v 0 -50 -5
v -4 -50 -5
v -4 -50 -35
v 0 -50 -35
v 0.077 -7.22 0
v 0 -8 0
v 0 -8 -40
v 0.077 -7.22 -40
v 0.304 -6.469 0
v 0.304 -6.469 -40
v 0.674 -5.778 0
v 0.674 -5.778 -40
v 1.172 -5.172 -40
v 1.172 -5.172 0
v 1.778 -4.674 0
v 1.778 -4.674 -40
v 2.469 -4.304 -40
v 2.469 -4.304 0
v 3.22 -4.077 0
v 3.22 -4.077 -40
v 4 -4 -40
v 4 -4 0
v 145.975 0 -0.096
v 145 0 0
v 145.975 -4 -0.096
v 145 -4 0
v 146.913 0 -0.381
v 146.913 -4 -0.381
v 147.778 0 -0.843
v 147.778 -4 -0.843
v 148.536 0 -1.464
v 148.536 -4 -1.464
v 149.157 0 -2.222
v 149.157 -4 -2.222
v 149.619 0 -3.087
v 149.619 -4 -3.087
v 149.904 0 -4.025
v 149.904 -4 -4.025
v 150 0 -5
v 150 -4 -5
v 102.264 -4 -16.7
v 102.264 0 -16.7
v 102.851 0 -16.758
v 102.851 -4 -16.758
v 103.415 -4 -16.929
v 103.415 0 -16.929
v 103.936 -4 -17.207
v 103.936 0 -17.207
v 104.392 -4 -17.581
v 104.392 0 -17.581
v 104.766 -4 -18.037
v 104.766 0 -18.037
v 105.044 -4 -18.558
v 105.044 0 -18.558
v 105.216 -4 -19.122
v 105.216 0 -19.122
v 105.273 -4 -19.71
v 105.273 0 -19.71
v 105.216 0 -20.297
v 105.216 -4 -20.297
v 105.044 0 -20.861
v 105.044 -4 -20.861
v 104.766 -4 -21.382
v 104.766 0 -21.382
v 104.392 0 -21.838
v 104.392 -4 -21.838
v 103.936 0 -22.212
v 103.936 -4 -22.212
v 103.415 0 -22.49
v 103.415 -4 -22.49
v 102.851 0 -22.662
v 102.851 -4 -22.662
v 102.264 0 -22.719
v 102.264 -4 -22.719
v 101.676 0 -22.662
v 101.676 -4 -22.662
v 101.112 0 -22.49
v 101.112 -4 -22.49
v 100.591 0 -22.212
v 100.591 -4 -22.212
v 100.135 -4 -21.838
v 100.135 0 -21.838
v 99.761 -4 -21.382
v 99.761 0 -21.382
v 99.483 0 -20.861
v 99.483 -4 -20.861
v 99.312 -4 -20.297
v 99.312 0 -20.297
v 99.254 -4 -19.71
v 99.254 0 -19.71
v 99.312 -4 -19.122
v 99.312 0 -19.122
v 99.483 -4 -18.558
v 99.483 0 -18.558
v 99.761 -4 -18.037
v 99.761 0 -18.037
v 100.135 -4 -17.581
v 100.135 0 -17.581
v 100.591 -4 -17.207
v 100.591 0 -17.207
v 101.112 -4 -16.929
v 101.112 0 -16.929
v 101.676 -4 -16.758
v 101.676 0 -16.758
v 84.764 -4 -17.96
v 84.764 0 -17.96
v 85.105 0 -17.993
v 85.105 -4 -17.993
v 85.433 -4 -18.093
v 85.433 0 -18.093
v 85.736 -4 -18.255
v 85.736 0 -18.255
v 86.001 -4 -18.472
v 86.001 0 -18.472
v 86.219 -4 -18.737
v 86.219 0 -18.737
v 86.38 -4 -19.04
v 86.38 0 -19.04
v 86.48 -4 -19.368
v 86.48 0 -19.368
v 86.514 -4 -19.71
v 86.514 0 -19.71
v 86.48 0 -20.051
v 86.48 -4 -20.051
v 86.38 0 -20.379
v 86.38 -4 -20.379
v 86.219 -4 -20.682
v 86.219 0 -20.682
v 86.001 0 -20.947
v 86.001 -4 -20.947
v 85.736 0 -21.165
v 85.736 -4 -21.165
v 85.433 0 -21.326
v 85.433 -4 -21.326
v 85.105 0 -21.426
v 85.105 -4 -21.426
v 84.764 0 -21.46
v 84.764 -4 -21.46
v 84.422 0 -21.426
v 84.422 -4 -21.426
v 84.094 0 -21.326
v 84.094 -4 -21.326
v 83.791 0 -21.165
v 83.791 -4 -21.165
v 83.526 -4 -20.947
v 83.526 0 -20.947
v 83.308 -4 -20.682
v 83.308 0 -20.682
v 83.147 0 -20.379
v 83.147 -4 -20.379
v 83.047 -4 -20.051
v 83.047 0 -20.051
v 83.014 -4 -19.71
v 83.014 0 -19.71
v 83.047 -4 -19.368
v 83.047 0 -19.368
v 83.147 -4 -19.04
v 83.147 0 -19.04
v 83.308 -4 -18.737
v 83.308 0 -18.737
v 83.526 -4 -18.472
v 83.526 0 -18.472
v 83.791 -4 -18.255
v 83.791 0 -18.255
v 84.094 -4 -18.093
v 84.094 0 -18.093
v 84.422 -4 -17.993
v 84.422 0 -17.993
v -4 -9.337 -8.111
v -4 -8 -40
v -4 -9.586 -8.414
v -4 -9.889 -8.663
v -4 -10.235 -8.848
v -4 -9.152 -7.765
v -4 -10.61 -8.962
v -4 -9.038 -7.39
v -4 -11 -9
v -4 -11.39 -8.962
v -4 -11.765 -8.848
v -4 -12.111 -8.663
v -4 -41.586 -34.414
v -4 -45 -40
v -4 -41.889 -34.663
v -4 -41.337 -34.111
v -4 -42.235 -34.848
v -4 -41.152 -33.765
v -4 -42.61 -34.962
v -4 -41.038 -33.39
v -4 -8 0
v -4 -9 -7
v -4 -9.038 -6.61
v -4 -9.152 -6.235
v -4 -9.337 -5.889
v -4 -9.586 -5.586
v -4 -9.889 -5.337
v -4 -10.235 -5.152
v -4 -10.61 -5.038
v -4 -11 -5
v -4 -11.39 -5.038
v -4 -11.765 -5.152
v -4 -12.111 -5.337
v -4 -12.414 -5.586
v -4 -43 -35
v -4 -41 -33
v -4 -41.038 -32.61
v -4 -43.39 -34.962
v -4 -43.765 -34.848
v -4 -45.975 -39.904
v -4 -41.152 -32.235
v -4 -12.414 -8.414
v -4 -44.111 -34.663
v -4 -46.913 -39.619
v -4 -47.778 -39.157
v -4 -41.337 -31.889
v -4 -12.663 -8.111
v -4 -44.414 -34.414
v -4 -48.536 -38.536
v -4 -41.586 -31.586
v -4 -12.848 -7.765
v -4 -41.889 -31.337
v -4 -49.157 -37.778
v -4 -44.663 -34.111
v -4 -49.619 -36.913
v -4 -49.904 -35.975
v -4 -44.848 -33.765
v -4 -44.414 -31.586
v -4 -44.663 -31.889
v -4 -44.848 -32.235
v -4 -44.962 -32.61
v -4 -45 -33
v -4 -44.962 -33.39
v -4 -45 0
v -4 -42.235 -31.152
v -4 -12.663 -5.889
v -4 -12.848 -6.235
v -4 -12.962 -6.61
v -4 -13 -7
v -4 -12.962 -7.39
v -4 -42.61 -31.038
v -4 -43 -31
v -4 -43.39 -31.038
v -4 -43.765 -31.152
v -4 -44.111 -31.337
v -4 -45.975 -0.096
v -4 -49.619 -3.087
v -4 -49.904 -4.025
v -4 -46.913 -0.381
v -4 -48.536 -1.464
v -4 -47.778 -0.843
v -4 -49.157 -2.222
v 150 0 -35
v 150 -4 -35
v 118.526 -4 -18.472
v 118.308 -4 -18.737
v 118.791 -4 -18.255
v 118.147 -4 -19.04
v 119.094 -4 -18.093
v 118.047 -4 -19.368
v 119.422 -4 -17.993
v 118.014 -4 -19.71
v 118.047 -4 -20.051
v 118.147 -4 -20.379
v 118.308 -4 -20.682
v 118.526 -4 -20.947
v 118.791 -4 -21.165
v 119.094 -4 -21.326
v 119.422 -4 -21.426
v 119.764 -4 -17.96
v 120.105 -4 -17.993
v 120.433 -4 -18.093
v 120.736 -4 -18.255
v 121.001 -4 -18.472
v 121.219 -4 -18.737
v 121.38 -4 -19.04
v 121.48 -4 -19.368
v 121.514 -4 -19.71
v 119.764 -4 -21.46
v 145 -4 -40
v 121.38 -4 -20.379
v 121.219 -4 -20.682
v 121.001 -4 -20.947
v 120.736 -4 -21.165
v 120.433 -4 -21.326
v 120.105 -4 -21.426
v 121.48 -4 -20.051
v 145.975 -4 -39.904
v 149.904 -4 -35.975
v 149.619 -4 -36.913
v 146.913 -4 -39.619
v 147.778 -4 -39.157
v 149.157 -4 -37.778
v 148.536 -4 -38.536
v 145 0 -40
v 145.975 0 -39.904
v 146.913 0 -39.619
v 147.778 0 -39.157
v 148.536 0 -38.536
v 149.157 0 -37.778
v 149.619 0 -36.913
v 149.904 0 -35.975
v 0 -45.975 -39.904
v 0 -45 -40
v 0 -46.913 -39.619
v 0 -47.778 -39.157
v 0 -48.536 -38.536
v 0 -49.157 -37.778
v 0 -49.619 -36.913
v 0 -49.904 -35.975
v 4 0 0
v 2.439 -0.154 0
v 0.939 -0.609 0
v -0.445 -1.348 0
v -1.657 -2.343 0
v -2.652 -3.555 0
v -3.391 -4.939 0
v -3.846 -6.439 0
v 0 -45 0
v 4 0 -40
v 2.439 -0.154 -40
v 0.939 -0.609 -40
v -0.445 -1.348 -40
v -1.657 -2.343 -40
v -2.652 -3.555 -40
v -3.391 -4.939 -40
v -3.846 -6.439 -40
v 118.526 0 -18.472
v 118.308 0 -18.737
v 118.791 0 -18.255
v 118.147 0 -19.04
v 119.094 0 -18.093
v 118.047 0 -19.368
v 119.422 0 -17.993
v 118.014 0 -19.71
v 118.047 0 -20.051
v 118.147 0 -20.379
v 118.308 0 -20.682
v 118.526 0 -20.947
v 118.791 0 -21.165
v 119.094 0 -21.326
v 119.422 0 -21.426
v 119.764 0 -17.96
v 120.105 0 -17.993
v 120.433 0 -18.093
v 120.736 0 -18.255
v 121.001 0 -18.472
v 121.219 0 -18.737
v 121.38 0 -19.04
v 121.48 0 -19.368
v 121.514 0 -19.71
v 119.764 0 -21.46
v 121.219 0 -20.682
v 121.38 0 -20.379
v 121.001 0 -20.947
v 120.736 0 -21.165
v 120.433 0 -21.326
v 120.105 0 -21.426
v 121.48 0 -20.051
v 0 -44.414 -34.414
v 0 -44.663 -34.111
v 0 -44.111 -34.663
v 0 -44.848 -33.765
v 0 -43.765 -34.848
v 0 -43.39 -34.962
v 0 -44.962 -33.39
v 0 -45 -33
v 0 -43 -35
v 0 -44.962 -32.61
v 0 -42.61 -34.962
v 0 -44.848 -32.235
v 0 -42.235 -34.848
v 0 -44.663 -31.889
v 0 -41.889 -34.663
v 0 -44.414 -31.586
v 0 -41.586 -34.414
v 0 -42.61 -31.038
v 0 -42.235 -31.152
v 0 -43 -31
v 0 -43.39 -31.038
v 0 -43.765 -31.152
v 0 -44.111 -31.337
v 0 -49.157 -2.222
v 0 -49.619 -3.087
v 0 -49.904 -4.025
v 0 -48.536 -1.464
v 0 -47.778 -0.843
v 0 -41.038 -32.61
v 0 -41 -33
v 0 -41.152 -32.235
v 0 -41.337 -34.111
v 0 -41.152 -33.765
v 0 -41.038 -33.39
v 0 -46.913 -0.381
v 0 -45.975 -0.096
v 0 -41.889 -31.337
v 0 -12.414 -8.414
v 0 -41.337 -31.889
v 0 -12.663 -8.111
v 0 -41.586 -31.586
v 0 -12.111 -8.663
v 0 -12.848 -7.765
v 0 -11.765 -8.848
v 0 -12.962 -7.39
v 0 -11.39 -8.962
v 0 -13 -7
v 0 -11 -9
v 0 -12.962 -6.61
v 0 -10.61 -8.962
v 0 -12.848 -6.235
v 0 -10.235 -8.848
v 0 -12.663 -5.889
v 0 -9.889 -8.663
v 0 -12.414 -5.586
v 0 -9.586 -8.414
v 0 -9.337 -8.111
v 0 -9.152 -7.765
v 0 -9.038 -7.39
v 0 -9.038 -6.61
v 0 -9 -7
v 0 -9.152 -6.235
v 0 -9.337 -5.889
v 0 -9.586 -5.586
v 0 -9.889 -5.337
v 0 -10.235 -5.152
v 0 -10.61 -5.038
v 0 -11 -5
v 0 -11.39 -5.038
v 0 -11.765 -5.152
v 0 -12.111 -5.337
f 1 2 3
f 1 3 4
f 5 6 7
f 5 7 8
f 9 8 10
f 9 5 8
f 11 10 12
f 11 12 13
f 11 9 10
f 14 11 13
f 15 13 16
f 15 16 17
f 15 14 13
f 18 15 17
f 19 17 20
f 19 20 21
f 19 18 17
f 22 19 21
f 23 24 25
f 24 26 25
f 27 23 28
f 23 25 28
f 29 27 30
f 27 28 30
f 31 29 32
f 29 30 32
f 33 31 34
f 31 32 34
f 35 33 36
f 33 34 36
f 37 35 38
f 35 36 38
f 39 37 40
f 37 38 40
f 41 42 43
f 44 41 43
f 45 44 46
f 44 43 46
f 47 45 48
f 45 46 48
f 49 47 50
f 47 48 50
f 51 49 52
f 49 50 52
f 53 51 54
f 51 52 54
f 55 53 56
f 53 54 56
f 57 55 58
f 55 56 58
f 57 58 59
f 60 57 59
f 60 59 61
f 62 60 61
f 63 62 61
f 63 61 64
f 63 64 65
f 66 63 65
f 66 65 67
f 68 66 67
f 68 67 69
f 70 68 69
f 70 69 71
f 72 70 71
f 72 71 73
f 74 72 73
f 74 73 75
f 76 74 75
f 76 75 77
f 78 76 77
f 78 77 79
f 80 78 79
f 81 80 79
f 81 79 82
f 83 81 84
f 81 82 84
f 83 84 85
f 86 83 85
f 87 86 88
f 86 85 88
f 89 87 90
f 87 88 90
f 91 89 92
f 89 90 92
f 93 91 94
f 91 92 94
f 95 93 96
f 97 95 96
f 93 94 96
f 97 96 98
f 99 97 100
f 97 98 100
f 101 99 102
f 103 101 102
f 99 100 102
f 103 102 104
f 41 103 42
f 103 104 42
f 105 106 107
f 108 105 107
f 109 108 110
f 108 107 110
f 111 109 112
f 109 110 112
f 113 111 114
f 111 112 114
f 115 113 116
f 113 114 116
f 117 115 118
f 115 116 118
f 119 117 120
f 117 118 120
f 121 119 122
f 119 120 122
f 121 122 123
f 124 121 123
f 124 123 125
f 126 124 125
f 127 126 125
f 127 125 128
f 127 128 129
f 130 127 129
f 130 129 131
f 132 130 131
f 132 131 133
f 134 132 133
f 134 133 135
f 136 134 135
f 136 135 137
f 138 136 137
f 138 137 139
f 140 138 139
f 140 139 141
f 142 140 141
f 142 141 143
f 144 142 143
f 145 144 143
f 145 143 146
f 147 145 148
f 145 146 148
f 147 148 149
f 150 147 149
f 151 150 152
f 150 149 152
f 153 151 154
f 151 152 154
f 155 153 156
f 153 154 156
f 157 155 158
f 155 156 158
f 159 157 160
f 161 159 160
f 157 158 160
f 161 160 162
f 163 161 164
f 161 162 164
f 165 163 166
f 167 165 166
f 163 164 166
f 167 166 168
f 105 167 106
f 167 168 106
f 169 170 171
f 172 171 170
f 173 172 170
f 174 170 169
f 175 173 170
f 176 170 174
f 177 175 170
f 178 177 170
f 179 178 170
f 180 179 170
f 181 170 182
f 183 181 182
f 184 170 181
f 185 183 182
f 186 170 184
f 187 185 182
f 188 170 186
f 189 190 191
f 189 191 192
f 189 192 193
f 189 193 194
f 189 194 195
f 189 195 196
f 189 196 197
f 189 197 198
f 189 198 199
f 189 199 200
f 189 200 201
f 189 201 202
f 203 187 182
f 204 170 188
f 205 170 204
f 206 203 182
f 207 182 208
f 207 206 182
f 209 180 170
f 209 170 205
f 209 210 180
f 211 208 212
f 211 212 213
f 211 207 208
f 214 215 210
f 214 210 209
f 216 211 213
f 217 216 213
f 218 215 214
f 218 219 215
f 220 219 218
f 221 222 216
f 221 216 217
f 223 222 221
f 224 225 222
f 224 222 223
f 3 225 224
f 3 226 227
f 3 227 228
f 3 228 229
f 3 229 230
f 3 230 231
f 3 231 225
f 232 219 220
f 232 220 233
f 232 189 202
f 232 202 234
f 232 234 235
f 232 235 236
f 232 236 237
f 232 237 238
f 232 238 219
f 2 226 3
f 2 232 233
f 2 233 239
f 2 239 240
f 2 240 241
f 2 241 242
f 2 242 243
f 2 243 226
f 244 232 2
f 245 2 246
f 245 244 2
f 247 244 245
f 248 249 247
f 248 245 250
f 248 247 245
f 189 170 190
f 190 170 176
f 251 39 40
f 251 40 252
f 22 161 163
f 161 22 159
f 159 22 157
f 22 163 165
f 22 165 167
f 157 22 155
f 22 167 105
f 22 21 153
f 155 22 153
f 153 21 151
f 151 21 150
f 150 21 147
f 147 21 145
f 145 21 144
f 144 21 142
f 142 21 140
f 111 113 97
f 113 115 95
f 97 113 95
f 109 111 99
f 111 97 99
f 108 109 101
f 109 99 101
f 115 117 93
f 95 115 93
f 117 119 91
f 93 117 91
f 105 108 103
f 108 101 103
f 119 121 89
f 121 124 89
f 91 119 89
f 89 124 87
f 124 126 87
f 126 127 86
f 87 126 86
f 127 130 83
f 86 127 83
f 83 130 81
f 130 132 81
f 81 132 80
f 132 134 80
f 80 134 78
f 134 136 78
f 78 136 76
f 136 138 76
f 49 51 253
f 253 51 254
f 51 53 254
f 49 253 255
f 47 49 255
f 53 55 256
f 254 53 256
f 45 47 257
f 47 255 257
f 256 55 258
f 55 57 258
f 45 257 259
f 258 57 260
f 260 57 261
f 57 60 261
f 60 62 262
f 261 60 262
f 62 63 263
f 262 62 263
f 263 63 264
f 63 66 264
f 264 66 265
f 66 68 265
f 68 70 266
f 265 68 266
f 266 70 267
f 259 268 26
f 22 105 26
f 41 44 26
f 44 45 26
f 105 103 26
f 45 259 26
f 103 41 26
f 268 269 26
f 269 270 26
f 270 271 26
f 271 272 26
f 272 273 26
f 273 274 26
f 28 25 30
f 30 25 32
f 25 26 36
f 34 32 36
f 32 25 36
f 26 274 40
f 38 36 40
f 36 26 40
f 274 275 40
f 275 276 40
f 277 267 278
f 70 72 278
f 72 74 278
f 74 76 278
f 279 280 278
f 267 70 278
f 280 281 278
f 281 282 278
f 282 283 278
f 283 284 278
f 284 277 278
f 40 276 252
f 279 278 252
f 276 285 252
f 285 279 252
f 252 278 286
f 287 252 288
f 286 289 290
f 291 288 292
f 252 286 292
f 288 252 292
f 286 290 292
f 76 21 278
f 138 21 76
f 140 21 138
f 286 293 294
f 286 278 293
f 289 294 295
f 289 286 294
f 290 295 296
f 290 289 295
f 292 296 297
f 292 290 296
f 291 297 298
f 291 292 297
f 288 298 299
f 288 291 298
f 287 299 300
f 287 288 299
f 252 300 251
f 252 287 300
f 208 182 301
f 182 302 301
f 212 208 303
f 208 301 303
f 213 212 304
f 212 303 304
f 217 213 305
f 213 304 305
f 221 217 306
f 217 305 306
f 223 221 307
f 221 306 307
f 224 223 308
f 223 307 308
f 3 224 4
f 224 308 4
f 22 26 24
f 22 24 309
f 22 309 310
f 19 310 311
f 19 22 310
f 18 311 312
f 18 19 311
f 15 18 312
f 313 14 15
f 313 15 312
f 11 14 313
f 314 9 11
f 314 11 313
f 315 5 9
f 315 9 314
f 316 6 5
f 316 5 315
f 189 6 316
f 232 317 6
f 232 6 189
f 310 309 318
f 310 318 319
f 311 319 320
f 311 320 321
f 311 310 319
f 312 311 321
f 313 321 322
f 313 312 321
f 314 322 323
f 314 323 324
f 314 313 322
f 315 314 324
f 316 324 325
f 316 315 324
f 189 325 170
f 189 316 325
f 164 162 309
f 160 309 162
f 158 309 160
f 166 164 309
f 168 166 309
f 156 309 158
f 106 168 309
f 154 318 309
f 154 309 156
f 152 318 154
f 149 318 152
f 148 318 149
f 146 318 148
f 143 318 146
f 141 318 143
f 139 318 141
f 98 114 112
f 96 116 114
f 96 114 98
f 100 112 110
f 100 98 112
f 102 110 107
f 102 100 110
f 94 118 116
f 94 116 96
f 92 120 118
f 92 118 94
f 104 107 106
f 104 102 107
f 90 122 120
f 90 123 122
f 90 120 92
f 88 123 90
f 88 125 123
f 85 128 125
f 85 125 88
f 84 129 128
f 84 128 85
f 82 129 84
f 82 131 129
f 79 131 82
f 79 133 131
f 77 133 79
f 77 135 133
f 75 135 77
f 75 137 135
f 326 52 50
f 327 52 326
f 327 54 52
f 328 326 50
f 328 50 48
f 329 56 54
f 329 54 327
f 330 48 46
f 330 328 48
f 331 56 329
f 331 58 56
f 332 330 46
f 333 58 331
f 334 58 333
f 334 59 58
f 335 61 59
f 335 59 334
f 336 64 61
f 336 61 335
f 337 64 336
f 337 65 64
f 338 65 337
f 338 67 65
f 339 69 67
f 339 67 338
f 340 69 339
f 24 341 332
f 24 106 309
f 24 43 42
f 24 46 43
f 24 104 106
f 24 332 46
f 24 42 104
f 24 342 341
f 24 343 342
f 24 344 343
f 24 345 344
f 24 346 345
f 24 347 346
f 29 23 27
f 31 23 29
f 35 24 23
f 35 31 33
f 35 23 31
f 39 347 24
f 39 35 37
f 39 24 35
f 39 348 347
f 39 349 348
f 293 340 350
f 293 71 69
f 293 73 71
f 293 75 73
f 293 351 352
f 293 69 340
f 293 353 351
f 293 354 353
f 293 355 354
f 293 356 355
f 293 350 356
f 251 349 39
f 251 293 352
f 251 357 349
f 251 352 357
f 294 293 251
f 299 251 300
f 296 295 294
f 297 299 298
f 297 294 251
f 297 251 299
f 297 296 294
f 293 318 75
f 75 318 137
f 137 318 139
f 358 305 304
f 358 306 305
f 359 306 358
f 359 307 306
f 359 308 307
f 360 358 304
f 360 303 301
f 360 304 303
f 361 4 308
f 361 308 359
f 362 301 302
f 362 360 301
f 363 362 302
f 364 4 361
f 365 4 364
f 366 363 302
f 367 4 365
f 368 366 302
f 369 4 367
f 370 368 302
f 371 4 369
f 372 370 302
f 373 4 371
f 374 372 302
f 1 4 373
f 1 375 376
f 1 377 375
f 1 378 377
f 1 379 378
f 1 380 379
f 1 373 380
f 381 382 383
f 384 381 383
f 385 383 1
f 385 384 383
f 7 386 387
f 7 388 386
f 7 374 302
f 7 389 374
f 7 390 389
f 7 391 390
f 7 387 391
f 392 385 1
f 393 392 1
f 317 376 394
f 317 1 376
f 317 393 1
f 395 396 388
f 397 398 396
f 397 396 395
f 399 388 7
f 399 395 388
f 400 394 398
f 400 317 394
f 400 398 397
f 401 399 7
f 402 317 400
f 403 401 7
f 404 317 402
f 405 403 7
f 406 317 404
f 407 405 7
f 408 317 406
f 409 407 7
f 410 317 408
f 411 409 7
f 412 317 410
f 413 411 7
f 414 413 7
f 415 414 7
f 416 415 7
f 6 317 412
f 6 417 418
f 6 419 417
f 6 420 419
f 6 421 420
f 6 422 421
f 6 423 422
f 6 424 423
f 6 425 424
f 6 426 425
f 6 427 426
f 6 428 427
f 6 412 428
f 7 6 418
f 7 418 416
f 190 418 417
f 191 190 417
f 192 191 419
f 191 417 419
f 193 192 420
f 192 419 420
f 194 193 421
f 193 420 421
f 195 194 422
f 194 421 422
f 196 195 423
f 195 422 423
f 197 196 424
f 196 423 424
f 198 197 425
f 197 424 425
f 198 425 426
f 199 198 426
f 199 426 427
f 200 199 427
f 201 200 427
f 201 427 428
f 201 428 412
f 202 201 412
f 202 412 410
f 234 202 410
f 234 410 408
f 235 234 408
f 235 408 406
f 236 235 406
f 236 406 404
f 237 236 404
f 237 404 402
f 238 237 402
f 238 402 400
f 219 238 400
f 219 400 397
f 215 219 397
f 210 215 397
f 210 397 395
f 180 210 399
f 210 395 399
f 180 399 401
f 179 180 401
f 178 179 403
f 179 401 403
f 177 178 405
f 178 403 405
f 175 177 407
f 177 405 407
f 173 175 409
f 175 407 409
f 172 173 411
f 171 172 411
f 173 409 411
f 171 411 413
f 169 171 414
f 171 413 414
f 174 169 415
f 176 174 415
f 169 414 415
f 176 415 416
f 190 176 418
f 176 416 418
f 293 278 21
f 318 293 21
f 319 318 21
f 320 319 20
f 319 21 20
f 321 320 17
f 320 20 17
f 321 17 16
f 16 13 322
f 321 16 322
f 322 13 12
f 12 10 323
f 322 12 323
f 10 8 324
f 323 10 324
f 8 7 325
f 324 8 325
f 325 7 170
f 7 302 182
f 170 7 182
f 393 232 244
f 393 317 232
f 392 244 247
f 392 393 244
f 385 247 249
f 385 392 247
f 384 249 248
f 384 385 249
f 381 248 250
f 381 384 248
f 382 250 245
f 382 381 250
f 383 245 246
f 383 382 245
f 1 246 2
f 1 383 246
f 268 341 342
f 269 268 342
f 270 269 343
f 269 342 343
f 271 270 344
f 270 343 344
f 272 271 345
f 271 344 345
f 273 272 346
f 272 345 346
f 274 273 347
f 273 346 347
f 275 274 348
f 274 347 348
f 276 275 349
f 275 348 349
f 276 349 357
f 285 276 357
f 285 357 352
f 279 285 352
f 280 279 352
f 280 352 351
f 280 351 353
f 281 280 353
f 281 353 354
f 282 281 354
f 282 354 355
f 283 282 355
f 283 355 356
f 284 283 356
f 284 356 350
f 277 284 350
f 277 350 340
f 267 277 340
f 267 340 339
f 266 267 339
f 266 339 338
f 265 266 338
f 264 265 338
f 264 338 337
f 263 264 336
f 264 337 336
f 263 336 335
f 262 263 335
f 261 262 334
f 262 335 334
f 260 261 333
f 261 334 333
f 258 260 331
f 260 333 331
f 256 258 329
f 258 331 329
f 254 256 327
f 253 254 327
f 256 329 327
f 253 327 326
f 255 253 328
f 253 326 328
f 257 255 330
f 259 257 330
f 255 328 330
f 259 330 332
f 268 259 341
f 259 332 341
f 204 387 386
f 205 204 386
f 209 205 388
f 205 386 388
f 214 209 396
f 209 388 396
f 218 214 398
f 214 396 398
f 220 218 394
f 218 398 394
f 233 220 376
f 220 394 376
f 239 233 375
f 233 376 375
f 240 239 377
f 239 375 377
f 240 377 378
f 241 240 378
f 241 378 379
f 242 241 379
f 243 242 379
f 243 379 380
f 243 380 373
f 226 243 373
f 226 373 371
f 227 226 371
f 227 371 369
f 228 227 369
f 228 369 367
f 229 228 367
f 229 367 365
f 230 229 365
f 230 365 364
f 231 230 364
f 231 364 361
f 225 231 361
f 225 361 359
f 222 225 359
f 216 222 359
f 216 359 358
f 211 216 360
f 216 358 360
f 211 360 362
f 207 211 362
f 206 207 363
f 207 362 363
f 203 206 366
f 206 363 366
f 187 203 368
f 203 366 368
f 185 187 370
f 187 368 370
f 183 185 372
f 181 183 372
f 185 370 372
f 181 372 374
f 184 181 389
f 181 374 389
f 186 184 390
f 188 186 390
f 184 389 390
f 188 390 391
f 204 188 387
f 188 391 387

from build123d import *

# Parameters (mm, degrees)
SKETCH1_W                    = 150
SKETCH1_H                    = 40
BASE_FLANGE1_DEPTH           = 4
EDGE_FLANGE1_STRIP_W         = 24
EDGE_FLANGE1_STRIP_H         = 4
EDGE_FLANGE1_STRIP_CUT_DEPTH = 40
EDGE_FLANGE1_DEPTH           = 40
SKETCH9_R                    = 2
CUT_EXTRUDE1_DEPTH           = 10
FILLET1_R                    = 5
SKETCH10_R                   = 3.009837712
SKETCH10_R_2                 = 1.75
CUT_EXTRUDE2_DEPTH           = 10


# Sheet-metal steps are written as plain solids
with BuildPart() as part:
    # Sketch1 → Base-Flange1 (new body)
    with BuildSketch(Plane(origin=(0, 0, 0), x_dir=(1, 0, 0), z_dir=(0, 1, 0))):
        with Locations((75, 20)):
            Rectangle(SKETCH1_W, SKETCH1_H)
    extrude(amount=-BASE_FLANGE1_DEPTH)

    # Edge-Flange1 strip (across the edge) → Edge-Flange1 strip cut (cut)
    with BuildSketch(Plane(origin=(0, -4, 0), x_dir=(1, 0, 0), z_dir=(0, 0, -1))):
        with Locations((-8, -2)):
            Rectangle(EDGE_FLANGE1_STRIP_W, EDGE_FLANGE1_STRIP_H)
    extrude(amount=EDGE_FLANGE1_STRIP_CUT_DEPTH, mode=Mode.SUBTRACT)

    # Edge-Flange1 section (across the edge) → Edge-Flange1 (add)
    with BuildSketch(Plane(origin=(0, -4, 0), x_dir=(1, 0, 0), z_dir=(0, 0, -1))):
        with BuildLine():
            Line((-4, 4), (-4, 46))
            Line((-4, 46), (0, 46))
            Line((0, 46), (0, 4))
            ThreePointArc((0, 4), (1.171572875, 1.171572875), (4, 0))
            Line((4, 0), (4, -4))
            ThreePointArc((4, -4), (-1.656854249, -1.656854249), (-4, 4))
        make_face()
    extrude(amount=EDGE_FLANGE1_DEPTH)

    # Sketch9 → Cut-Extrude1 (cut)
    with BuildSketch(Plane(origin=(0, 0, 0), x_dir=(0, 0, -1), z_dir=(1, 0, 0))):
        with Locations(Location((7, -11, 0), (0, 0, 90))):
            Circle(SKETCH9_R)
        with Locations(Location((33, -43, 0), (0, 0, 90))):
            Circle(SKETCH9_R)
    extrude(amount=-CUT_EXTRUDE1_DEPTH, mode=Mode.SUBTRACT)

    # Fillet1
    fillet1_edges = [part.edges().sort_by_distance(p)[0] for p in [
        (-2, -50, 0),
        (-2, -50, -40),
        (150, -2, -40),
        (150, -2, 0),
    ]]
    fillet(fillet1_edges, radius=FILLET1_R)

    # Sketch10 → Cut-Extrude2 (cut)
    with BuildSketch(Plane(origin=(0, 0, 0), x_dir=(1, 0, 0), z_dir=(0, 1, 0))):
        with Locations(Location((102.263543229, 19.709585113, 0), (0, 0, 270))):
            Circle(SKETCH10_R)
        with Locations(Location((119.763543229, 19.709585113, 0), (0, 0, 270))):
            Circle(SKETCH10_R_2)
        with Locations(Location((84.763543229, 19.709585113, 0), (0, 0, 270))):
            Circle(SKETCH10_R_2)
    extrude(amount=-CUT_EXTRUDE2_DEPTH, mode=Mode.SUBTRACT)


solid = part.part
